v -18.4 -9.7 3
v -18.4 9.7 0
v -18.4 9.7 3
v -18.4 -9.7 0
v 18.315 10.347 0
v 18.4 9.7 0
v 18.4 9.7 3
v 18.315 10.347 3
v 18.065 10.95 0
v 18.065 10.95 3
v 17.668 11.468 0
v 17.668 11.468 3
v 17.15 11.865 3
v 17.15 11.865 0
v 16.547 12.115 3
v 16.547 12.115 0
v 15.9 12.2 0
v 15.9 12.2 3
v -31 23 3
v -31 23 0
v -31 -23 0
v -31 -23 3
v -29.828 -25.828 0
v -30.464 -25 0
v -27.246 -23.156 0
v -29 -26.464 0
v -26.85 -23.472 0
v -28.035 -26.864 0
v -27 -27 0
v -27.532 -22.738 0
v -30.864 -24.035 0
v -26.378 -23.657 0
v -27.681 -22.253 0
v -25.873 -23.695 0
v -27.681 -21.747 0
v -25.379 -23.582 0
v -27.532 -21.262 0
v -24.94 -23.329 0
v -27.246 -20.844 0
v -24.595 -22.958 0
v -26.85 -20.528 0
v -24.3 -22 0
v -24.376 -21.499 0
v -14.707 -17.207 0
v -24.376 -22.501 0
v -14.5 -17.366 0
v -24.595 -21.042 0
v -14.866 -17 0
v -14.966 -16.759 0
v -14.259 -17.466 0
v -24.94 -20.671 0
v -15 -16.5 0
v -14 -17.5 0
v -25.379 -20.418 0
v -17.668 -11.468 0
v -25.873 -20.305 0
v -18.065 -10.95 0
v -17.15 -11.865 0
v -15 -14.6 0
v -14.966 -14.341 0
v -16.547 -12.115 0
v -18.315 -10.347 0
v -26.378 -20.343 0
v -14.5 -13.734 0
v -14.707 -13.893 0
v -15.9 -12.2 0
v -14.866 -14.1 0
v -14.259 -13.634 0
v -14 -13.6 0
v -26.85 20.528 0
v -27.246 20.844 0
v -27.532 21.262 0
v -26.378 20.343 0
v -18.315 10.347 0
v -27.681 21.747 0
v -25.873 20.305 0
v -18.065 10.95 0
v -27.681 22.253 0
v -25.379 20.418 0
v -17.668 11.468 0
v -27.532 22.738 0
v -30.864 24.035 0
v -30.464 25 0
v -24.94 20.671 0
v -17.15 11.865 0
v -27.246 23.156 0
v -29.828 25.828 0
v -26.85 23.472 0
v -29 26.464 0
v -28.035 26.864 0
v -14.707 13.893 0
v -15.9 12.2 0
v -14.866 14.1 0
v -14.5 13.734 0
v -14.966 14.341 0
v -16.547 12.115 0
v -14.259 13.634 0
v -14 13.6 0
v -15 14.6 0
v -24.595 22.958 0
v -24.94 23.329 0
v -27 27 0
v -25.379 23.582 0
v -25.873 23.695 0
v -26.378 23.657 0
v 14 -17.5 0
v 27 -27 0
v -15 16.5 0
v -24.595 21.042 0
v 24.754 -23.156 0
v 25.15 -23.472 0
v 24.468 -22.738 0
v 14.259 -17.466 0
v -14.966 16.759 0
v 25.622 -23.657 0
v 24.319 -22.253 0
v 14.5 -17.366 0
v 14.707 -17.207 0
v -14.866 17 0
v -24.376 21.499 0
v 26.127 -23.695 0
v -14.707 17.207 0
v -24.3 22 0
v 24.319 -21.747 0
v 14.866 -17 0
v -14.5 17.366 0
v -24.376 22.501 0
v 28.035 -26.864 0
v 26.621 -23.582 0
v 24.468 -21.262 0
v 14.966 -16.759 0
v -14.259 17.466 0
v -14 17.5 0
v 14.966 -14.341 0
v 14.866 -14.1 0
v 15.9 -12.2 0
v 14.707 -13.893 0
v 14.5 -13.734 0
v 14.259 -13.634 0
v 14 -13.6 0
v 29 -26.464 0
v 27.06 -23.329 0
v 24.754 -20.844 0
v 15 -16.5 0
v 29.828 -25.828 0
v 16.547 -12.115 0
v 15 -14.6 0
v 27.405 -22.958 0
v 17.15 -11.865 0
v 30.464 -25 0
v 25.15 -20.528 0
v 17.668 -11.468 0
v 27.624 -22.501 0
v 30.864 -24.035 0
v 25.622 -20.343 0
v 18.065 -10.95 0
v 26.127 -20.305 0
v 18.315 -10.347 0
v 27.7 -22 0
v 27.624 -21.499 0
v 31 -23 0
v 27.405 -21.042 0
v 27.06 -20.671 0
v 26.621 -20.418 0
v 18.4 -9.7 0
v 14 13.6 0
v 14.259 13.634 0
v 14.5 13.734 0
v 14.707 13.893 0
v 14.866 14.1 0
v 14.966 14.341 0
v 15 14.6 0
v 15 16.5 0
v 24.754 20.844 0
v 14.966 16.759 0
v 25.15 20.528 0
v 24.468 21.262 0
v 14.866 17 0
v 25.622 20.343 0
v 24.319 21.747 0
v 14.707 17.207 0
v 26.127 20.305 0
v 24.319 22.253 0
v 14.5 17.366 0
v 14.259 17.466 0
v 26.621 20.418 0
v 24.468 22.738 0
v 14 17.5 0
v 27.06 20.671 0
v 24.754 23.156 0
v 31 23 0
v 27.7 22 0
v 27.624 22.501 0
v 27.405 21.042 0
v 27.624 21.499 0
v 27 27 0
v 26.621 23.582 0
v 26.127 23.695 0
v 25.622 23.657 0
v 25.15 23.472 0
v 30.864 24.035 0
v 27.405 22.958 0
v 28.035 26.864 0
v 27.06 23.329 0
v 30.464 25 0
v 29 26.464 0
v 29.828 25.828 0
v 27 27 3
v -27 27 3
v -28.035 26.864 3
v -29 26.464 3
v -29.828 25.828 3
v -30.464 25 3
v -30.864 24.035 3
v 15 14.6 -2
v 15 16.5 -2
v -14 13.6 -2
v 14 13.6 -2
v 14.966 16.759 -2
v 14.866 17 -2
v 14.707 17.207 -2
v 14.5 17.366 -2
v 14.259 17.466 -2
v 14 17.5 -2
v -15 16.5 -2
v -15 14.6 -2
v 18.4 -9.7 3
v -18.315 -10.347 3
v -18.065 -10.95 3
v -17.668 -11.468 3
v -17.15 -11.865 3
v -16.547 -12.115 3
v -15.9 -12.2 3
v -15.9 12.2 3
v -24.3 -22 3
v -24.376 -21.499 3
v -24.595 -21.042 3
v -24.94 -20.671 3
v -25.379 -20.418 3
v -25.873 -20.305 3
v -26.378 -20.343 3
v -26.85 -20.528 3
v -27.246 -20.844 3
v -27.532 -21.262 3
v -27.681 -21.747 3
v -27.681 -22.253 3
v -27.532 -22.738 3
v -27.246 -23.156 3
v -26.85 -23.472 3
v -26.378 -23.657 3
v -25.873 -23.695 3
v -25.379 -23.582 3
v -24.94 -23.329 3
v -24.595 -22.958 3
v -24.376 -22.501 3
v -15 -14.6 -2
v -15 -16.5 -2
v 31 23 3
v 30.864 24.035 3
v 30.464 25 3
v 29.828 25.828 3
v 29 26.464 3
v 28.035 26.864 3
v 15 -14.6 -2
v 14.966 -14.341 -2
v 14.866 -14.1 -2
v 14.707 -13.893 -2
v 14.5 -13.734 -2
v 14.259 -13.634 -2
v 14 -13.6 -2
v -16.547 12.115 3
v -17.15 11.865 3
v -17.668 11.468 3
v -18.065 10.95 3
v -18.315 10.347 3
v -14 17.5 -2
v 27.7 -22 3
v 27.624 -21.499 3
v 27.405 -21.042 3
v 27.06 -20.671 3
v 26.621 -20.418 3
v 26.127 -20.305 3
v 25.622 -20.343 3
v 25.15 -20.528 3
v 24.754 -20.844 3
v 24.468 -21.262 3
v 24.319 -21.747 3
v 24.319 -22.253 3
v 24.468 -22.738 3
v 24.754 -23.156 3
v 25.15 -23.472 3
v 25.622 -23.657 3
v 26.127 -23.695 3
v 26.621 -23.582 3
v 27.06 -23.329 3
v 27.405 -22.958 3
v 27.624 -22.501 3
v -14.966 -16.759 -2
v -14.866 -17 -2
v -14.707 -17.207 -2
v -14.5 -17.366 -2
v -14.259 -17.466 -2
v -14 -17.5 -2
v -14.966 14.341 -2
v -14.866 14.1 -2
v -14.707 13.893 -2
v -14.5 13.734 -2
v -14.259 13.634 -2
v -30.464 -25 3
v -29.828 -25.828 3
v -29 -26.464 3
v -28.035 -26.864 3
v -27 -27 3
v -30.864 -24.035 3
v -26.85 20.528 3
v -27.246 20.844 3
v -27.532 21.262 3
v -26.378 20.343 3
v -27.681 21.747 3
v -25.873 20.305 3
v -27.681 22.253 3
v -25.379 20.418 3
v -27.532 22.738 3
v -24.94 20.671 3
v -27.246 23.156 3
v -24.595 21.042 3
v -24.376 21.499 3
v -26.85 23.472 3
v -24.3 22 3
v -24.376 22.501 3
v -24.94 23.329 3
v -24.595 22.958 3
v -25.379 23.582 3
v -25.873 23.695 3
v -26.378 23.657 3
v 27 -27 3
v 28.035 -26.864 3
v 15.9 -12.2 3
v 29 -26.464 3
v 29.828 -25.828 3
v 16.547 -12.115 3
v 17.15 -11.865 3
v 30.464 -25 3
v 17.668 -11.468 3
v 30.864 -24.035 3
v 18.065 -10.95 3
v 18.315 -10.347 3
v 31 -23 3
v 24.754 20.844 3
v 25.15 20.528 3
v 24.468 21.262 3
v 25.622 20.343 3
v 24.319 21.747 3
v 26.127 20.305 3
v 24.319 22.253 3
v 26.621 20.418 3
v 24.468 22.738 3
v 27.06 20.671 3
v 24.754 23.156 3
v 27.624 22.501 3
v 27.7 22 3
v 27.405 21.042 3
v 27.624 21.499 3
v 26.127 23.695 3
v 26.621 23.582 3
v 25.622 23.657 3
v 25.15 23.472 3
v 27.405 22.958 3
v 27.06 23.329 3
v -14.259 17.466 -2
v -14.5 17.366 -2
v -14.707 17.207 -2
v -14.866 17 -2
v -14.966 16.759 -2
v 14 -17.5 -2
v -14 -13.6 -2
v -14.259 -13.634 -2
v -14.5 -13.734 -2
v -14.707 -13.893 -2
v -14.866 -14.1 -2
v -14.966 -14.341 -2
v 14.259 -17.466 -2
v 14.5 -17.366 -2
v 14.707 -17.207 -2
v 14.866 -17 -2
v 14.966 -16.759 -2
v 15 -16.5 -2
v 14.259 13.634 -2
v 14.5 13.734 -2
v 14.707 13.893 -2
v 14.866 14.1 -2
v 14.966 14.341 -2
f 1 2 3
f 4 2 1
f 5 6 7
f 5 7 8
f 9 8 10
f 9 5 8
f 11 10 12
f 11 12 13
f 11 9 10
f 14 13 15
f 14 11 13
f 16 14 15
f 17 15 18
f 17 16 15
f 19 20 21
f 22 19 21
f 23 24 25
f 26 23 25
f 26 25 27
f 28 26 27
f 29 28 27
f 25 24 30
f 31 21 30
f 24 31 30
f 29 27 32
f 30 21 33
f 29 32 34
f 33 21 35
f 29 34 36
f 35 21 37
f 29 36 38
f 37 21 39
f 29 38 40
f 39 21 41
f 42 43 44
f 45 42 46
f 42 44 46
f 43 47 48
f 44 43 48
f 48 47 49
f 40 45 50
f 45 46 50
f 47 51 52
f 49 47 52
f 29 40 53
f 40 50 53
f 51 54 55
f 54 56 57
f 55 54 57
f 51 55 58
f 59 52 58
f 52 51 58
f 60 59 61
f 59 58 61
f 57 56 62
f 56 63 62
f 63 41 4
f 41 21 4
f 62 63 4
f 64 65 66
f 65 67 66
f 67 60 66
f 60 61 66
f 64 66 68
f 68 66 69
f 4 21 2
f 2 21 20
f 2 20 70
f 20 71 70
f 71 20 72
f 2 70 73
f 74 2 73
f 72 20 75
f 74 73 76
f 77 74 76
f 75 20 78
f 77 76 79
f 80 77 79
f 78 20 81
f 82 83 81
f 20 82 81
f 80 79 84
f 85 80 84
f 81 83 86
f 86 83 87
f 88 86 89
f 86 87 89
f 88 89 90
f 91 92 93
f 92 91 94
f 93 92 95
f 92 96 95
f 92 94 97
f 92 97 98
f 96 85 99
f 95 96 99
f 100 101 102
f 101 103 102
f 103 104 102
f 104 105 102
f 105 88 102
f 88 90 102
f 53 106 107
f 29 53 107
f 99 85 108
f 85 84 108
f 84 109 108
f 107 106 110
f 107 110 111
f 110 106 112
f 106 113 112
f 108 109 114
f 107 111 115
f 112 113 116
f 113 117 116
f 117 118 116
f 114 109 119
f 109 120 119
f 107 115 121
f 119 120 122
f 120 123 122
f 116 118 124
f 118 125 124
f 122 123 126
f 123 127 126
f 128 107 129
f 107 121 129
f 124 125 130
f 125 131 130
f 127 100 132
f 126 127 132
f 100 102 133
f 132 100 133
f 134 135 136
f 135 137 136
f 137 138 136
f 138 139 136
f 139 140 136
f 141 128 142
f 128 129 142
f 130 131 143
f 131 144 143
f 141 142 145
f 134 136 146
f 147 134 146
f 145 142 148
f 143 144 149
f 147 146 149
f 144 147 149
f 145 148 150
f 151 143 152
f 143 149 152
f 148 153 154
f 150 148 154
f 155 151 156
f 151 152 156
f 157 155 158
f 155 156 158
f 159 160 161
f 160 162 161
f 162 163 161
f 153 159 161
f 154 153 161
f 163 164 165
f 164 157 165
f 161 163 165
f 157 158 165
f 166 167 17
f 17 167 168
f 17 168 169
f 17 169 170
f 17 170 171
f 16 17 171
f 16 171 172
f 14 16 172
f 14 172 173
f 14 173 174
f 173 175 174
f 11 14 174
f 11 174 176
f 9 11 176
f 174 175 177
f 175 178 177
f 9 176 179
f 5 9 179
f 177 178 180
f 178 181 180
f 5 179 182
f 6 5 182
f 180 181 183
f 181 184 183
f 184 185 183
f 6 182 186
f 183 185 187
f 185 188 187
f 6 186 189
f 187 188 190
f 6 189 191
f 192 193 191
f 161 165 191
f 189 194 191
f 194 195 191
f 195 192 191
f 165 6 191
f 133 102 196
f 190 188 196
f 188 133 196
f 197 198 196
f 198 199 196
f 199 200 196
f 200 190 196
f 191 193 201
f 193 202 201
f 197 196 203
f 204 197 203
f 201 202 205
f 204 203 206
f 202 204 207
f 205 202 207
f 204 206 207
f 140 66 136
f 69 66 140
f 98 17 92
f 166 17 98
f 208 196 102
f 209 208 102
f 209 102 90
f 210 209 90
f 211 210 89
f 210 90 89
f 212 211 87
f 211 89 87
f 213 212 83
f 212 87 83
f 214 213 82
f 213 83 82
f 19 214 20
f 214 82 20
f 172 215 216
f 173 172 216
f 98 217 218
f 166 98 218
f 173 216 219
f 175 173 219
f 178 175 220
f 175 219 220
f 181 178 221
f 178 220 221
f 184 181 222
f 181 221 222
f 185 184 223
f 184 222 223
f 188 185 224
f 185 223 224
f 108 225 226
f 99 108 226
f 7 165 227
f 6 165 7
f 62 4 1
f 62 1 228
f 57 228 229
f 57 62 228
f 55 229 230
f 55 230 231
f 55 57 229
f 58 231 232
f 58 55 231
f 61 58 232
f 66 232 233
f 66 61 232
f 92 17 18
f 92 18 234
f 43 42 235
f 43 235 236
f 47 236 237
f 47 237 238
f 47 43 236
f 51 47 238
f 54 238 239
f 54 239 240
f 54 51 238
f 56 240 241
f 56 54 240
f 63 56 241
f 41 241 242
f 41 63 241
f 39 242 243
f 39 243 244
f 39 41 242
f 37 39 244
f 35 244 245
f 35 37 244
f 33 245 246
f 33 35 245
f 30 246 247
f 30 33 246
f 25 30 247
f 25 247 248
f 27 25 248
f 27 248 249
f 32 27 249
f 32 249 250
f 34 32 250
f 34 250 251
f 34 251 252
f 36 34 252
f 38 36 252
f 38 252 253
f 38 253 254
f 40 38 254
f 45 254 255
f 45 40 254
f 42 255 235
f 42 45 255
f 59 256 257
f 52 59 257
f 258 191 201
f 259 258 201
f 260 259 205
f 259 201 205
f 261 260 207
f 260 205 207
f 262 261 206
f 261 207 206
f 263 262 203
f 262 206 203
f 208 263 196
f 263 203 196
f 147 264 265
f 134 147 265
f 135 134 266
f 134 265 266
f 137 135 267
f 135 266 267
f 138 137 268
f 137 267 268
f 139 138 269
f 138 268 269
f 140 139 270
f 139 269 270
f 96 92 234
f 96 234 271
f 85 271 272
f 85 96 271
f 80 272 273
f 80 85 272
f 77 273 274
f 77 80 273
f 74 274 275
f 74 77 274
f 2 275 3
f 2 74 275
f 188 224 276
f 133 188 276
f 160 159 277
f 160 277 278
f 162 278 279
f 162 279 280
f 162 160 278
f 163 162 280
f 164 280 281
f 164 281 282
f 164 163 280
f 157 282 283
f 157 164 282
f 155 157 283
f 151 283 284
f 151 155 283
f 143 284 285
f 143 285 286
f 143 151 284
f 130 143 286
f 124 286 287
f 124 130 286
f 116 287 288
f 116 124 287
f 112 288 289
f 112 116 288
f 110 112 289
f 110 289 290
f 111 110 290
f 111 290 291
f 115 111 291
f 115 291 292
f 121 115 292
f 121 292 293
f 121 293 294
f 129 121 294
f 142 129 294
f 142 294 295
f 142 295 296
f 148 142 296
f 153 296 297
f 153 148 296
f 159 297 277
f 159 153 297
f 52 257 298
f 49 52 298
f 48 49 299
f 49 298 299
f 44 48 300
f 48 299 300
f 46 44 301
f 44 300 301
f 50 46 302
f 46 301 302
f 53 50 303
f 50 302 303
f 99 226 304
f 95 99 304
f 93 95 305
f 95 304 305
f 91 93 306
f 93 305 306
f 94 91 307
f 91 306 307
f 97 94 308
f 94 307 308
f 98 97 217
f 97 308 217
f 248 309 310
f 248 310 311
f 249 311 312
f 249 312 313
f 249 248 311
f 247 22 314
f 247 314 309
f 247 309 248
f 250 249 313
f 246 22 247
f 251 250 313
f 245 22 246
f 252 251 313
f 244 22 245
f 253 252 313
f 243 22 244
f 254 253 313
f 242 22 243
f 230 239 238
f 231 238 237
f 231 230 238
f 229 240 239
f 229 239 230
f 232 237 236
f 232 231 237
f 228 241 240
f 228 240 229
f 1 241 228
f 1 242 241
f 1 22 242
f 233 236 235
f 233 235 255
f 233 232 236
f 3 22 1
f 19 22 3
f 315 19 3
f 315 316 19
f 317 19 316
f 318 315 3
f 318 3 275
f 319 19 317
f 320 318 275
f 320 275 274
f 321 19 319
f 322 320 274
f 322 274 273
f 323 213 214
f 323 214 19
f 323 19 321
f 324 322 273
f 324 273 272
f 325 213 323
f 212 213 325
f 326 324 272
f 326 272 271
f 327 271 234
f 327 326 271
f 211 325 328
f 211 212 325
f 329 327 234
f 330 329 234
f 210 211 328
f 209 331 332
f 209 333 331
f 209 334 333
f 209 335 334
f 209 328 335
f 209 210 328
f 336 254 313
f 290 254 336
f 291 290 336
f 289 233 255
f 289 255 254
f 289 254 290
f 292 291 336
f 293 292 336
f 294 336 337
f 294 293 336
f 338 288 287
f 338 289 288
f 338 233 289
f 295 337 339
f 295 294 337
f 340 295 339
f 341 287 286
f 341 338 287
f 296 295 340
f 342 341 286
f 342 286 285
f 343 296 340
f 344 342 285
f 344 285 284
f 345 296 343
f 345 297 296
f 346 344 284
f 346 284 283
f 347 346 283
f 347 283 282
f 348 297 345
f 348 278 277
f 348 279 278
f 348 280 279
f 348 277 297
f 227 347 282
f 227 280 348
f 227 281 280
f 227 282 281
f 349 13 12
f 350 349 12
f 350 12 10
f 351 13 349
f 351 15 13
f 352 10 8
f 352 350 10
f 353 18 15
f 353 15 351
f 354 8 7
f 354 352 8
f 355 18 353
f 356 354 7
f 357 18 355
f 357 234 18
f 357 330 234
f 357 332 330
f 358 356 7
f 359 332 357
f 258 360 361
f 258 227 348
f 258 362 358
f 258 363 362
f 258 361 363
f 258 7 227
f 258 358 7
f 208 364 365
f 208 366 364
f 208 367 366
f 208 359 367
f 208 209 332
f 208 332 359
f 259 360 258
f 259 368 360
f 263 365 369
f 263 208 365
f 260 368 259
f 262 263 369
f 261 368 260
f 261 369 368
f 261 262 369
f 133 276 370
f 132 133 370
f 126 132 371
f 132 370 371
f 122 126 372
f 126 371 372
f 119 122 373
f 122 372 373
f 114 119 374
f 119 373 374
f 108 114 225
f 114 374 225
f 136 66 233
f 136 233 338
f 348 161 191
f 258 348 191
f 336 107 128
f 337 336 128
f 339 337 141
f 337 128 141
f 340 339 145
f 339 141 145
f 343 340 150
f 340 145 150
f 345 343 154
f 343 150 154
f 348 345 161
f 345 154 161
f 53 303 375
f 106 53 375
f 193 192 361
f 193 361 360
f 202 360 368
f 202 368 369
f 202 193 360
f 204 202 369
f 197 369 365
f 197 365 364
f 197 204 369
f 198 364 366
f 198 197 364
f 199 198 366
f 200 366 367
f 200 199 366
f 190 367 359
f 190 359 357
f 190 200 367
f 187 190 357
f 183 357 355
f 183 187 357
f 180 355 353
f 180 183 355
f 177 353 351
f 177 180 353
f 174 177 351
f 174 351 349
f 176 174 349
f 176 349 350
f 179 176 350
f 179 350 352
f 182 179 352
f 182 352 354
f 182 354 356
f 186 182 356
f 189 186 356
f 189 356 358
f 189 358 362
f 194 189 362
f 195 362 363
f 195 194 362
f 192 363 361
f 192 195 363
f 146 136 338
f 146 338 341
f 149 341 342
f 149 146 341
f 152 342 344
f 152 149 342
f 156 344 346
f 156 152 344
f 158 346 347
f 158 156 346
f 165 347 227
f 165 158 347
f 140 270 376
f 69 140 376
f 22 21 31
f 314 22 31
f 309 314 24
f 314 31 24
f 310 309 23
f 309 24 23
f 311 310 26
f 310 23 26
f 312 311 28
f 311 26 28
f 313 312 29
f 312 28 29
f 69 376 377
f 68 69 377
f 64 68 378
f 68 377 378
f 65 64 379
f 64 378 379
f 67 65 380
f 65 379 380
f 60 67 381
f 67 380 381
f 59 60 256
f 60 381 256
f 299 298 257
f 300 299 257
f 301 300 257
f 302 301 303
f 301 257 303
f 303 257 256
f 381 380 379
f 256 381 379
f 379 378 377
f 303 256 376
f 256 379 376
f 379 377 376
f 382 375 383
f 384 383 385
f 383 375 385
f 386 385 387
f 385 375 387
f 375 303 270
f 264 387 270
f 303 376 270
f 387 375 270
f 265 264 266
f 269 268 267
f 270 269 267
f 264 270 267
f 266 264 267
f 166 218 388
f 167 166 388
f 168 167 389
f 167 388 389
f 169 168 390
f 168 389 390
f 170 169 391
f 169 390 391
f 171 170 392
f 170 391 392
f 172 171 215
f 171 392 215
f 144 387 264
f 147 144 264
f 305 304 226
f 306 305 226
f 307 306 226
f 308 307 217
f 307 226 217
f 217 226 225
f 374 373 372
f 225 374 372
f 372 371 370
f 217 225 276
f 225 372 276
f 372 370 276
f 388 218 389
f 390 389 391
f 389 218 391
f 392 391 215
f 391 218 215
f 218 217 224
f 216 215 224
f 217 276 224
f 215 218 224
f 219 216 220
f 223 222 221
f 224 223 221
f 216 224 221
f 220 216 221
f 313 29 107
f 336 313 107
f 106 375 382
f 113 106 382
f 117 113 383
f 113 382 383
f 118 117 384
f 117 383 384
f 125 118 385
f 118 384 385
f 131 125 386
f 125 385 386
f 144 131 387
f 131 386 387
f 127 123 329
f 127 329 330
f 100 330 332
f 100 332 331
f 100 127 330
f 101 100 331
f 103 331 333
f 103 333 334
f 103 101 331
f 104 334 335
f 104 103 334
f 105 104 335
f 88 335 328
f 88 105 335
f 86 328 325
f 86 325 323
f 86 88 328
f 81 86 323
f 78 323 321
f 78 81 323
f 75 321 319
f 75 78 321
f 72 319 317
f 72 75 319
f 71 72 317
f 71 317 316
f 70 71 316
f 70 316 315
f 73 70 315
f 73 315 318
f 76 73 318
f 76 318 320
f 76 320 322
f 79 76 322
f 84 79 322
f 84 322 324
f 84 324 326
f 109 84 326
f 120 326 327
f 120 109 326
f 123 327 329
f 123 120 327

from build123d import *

# Parameters (mm, degrees)
OUTER_CLAMP_COVER_62X54X3_SKETCH_R = 1.7
OUTER_CLAMP_COVER_62X54X3_DEPTH    = 3
TWO_CASE_RETAINING_FEET_START      = -2
TWO_CASE_RETAINING_FEET_DEPTH      = 2


with BuildPart() as part:
    # Outer_clamp_cover_62x54x3_Sketch → Outer_clamp_cover_62x54x3 (new body)
    with BuildSketch(Plane.XY):
        with BuildLine():
            Line((-27, -27), (27, -27))
            ThreePointArc((27, -27), (29.828427125, -25.828427125), (31, -23))
            Line((31, -23), (31, 23))
            ThreePointArc((31, 23), (29.828427125, 25.828427125), (27, 27))
            Line((27, 27), (-27, 27))
            ThreePointArc((-27, 27), (-29.828427125, 25.828427125), (-31, 23))
            Line((-31, 23), (-31, -23))
            ThreePointArc((-31, -23), (-29.828427125, -25.828427125), (-27, -27))
        make_face()
        with Locations((-26, -22)):
            Circle(OUTER_CLAMP_COVER_62X54X3_SKETCH_R, mode=Mode.SUBTRACT)
        with Locations((-26, 22)):
            Circle(OUTER_CLAMP_COVER_62X54X3_SKETCH_R, mode=Mode.SUBTRACT)
        with Locations((26, -22)):
            Circle(OUTER_CLAMP_COVER_62X54X3_SKETCH_R, mode=Mode.SUBTRACT)
        with Locations((26, 22)):
            Circle(OUTER_CLAMP_COVER_62X54X3_SKETCH_R, mode=Mode.SUBTRACT)
        with BuildLine():
            Line((-15.9, -12.2), (15.9, -12.2))
            ThreePointArc((15.9, -12.2), (17.667766953, -11.467766953), (18.4, -9.7))
            Line((18.4, -9.7), (18.4, 9.7))
            ThreePointArc((18.4, 9.7), (17.667766953, 11.467766953), (15.9, 12.2))
            Line((15.9, 12.2), (-15.9, 12.2))
            ThreePointArc((-15.9, 12.2), (-17.667766953, 11.467766953), (-18.4, 9.7))
            Line((-18.4, 9.7), (-18.4, -9.7))
            ThreePointArc((-18.4, -9.7), (-17.667766953, -11.467766953), (-15.9, -12.2))
        make_face(mode=Mode.SUBTRACT)
    extrude(amount=OUTER_CLAMP_COVER_62X54X3_DEPTH)

    # Two_case_retaining_feet_Sketch → Two_case_retaining_feet (add)
    with BuildSketch(Plane.XY.offset(TWO_CASE_RETAINING_FEET_START)):
        with BuildLine():
            Line((-14, -17.5), (14, -17.5))
            ThreePointArc((14, -17.5), (14.707106781, -17.207106781), (15, -16.5))
            Line((15, -16.5), (15, -14.6))
            ThreePointArc((15, -14.6), (14.707106781, -13.892893219), (14, -13.6))
            Line((14, -13.6), (-14, -13.6))
            ThreePointArc((-14, -13.6), (-14.707106781, -13.892893219), (-15, -14.6))
            Line((-15, -14.6), (-15, -16.5))
            ThreePointArc((-15, -16.5), (-14.707106781, -17.207106781), (-14, -17.5))
        make_face()
        with BuildLine():
            Line((-14, 13.6), (14, 13.6))
            ThreePointArc((14, 13.6), (14.707106781, 13.892893219), (15, 14.6))
            Line((15, 14.6), (15, 16.5))
            ThreePointArc((15, 16.5), (14.707106781, 17.207106781), (14, 17.5))
            Line((14, 17.5), (-14, 17.5))
            ThreePointArc((-14, 17.5), (-14.707106781, 17.207106781), (-15, 16.5))
            Line((-15, 16.5), (-15, 14.6))
            ThreePointArc((-15, 14.6), (-14.707106781, 13.892893219), (-14, 13.6))
        make_face()
    extrude(amount=TWO_CASE_RETAINING_FEET_DEPTH)


solid = part.part
